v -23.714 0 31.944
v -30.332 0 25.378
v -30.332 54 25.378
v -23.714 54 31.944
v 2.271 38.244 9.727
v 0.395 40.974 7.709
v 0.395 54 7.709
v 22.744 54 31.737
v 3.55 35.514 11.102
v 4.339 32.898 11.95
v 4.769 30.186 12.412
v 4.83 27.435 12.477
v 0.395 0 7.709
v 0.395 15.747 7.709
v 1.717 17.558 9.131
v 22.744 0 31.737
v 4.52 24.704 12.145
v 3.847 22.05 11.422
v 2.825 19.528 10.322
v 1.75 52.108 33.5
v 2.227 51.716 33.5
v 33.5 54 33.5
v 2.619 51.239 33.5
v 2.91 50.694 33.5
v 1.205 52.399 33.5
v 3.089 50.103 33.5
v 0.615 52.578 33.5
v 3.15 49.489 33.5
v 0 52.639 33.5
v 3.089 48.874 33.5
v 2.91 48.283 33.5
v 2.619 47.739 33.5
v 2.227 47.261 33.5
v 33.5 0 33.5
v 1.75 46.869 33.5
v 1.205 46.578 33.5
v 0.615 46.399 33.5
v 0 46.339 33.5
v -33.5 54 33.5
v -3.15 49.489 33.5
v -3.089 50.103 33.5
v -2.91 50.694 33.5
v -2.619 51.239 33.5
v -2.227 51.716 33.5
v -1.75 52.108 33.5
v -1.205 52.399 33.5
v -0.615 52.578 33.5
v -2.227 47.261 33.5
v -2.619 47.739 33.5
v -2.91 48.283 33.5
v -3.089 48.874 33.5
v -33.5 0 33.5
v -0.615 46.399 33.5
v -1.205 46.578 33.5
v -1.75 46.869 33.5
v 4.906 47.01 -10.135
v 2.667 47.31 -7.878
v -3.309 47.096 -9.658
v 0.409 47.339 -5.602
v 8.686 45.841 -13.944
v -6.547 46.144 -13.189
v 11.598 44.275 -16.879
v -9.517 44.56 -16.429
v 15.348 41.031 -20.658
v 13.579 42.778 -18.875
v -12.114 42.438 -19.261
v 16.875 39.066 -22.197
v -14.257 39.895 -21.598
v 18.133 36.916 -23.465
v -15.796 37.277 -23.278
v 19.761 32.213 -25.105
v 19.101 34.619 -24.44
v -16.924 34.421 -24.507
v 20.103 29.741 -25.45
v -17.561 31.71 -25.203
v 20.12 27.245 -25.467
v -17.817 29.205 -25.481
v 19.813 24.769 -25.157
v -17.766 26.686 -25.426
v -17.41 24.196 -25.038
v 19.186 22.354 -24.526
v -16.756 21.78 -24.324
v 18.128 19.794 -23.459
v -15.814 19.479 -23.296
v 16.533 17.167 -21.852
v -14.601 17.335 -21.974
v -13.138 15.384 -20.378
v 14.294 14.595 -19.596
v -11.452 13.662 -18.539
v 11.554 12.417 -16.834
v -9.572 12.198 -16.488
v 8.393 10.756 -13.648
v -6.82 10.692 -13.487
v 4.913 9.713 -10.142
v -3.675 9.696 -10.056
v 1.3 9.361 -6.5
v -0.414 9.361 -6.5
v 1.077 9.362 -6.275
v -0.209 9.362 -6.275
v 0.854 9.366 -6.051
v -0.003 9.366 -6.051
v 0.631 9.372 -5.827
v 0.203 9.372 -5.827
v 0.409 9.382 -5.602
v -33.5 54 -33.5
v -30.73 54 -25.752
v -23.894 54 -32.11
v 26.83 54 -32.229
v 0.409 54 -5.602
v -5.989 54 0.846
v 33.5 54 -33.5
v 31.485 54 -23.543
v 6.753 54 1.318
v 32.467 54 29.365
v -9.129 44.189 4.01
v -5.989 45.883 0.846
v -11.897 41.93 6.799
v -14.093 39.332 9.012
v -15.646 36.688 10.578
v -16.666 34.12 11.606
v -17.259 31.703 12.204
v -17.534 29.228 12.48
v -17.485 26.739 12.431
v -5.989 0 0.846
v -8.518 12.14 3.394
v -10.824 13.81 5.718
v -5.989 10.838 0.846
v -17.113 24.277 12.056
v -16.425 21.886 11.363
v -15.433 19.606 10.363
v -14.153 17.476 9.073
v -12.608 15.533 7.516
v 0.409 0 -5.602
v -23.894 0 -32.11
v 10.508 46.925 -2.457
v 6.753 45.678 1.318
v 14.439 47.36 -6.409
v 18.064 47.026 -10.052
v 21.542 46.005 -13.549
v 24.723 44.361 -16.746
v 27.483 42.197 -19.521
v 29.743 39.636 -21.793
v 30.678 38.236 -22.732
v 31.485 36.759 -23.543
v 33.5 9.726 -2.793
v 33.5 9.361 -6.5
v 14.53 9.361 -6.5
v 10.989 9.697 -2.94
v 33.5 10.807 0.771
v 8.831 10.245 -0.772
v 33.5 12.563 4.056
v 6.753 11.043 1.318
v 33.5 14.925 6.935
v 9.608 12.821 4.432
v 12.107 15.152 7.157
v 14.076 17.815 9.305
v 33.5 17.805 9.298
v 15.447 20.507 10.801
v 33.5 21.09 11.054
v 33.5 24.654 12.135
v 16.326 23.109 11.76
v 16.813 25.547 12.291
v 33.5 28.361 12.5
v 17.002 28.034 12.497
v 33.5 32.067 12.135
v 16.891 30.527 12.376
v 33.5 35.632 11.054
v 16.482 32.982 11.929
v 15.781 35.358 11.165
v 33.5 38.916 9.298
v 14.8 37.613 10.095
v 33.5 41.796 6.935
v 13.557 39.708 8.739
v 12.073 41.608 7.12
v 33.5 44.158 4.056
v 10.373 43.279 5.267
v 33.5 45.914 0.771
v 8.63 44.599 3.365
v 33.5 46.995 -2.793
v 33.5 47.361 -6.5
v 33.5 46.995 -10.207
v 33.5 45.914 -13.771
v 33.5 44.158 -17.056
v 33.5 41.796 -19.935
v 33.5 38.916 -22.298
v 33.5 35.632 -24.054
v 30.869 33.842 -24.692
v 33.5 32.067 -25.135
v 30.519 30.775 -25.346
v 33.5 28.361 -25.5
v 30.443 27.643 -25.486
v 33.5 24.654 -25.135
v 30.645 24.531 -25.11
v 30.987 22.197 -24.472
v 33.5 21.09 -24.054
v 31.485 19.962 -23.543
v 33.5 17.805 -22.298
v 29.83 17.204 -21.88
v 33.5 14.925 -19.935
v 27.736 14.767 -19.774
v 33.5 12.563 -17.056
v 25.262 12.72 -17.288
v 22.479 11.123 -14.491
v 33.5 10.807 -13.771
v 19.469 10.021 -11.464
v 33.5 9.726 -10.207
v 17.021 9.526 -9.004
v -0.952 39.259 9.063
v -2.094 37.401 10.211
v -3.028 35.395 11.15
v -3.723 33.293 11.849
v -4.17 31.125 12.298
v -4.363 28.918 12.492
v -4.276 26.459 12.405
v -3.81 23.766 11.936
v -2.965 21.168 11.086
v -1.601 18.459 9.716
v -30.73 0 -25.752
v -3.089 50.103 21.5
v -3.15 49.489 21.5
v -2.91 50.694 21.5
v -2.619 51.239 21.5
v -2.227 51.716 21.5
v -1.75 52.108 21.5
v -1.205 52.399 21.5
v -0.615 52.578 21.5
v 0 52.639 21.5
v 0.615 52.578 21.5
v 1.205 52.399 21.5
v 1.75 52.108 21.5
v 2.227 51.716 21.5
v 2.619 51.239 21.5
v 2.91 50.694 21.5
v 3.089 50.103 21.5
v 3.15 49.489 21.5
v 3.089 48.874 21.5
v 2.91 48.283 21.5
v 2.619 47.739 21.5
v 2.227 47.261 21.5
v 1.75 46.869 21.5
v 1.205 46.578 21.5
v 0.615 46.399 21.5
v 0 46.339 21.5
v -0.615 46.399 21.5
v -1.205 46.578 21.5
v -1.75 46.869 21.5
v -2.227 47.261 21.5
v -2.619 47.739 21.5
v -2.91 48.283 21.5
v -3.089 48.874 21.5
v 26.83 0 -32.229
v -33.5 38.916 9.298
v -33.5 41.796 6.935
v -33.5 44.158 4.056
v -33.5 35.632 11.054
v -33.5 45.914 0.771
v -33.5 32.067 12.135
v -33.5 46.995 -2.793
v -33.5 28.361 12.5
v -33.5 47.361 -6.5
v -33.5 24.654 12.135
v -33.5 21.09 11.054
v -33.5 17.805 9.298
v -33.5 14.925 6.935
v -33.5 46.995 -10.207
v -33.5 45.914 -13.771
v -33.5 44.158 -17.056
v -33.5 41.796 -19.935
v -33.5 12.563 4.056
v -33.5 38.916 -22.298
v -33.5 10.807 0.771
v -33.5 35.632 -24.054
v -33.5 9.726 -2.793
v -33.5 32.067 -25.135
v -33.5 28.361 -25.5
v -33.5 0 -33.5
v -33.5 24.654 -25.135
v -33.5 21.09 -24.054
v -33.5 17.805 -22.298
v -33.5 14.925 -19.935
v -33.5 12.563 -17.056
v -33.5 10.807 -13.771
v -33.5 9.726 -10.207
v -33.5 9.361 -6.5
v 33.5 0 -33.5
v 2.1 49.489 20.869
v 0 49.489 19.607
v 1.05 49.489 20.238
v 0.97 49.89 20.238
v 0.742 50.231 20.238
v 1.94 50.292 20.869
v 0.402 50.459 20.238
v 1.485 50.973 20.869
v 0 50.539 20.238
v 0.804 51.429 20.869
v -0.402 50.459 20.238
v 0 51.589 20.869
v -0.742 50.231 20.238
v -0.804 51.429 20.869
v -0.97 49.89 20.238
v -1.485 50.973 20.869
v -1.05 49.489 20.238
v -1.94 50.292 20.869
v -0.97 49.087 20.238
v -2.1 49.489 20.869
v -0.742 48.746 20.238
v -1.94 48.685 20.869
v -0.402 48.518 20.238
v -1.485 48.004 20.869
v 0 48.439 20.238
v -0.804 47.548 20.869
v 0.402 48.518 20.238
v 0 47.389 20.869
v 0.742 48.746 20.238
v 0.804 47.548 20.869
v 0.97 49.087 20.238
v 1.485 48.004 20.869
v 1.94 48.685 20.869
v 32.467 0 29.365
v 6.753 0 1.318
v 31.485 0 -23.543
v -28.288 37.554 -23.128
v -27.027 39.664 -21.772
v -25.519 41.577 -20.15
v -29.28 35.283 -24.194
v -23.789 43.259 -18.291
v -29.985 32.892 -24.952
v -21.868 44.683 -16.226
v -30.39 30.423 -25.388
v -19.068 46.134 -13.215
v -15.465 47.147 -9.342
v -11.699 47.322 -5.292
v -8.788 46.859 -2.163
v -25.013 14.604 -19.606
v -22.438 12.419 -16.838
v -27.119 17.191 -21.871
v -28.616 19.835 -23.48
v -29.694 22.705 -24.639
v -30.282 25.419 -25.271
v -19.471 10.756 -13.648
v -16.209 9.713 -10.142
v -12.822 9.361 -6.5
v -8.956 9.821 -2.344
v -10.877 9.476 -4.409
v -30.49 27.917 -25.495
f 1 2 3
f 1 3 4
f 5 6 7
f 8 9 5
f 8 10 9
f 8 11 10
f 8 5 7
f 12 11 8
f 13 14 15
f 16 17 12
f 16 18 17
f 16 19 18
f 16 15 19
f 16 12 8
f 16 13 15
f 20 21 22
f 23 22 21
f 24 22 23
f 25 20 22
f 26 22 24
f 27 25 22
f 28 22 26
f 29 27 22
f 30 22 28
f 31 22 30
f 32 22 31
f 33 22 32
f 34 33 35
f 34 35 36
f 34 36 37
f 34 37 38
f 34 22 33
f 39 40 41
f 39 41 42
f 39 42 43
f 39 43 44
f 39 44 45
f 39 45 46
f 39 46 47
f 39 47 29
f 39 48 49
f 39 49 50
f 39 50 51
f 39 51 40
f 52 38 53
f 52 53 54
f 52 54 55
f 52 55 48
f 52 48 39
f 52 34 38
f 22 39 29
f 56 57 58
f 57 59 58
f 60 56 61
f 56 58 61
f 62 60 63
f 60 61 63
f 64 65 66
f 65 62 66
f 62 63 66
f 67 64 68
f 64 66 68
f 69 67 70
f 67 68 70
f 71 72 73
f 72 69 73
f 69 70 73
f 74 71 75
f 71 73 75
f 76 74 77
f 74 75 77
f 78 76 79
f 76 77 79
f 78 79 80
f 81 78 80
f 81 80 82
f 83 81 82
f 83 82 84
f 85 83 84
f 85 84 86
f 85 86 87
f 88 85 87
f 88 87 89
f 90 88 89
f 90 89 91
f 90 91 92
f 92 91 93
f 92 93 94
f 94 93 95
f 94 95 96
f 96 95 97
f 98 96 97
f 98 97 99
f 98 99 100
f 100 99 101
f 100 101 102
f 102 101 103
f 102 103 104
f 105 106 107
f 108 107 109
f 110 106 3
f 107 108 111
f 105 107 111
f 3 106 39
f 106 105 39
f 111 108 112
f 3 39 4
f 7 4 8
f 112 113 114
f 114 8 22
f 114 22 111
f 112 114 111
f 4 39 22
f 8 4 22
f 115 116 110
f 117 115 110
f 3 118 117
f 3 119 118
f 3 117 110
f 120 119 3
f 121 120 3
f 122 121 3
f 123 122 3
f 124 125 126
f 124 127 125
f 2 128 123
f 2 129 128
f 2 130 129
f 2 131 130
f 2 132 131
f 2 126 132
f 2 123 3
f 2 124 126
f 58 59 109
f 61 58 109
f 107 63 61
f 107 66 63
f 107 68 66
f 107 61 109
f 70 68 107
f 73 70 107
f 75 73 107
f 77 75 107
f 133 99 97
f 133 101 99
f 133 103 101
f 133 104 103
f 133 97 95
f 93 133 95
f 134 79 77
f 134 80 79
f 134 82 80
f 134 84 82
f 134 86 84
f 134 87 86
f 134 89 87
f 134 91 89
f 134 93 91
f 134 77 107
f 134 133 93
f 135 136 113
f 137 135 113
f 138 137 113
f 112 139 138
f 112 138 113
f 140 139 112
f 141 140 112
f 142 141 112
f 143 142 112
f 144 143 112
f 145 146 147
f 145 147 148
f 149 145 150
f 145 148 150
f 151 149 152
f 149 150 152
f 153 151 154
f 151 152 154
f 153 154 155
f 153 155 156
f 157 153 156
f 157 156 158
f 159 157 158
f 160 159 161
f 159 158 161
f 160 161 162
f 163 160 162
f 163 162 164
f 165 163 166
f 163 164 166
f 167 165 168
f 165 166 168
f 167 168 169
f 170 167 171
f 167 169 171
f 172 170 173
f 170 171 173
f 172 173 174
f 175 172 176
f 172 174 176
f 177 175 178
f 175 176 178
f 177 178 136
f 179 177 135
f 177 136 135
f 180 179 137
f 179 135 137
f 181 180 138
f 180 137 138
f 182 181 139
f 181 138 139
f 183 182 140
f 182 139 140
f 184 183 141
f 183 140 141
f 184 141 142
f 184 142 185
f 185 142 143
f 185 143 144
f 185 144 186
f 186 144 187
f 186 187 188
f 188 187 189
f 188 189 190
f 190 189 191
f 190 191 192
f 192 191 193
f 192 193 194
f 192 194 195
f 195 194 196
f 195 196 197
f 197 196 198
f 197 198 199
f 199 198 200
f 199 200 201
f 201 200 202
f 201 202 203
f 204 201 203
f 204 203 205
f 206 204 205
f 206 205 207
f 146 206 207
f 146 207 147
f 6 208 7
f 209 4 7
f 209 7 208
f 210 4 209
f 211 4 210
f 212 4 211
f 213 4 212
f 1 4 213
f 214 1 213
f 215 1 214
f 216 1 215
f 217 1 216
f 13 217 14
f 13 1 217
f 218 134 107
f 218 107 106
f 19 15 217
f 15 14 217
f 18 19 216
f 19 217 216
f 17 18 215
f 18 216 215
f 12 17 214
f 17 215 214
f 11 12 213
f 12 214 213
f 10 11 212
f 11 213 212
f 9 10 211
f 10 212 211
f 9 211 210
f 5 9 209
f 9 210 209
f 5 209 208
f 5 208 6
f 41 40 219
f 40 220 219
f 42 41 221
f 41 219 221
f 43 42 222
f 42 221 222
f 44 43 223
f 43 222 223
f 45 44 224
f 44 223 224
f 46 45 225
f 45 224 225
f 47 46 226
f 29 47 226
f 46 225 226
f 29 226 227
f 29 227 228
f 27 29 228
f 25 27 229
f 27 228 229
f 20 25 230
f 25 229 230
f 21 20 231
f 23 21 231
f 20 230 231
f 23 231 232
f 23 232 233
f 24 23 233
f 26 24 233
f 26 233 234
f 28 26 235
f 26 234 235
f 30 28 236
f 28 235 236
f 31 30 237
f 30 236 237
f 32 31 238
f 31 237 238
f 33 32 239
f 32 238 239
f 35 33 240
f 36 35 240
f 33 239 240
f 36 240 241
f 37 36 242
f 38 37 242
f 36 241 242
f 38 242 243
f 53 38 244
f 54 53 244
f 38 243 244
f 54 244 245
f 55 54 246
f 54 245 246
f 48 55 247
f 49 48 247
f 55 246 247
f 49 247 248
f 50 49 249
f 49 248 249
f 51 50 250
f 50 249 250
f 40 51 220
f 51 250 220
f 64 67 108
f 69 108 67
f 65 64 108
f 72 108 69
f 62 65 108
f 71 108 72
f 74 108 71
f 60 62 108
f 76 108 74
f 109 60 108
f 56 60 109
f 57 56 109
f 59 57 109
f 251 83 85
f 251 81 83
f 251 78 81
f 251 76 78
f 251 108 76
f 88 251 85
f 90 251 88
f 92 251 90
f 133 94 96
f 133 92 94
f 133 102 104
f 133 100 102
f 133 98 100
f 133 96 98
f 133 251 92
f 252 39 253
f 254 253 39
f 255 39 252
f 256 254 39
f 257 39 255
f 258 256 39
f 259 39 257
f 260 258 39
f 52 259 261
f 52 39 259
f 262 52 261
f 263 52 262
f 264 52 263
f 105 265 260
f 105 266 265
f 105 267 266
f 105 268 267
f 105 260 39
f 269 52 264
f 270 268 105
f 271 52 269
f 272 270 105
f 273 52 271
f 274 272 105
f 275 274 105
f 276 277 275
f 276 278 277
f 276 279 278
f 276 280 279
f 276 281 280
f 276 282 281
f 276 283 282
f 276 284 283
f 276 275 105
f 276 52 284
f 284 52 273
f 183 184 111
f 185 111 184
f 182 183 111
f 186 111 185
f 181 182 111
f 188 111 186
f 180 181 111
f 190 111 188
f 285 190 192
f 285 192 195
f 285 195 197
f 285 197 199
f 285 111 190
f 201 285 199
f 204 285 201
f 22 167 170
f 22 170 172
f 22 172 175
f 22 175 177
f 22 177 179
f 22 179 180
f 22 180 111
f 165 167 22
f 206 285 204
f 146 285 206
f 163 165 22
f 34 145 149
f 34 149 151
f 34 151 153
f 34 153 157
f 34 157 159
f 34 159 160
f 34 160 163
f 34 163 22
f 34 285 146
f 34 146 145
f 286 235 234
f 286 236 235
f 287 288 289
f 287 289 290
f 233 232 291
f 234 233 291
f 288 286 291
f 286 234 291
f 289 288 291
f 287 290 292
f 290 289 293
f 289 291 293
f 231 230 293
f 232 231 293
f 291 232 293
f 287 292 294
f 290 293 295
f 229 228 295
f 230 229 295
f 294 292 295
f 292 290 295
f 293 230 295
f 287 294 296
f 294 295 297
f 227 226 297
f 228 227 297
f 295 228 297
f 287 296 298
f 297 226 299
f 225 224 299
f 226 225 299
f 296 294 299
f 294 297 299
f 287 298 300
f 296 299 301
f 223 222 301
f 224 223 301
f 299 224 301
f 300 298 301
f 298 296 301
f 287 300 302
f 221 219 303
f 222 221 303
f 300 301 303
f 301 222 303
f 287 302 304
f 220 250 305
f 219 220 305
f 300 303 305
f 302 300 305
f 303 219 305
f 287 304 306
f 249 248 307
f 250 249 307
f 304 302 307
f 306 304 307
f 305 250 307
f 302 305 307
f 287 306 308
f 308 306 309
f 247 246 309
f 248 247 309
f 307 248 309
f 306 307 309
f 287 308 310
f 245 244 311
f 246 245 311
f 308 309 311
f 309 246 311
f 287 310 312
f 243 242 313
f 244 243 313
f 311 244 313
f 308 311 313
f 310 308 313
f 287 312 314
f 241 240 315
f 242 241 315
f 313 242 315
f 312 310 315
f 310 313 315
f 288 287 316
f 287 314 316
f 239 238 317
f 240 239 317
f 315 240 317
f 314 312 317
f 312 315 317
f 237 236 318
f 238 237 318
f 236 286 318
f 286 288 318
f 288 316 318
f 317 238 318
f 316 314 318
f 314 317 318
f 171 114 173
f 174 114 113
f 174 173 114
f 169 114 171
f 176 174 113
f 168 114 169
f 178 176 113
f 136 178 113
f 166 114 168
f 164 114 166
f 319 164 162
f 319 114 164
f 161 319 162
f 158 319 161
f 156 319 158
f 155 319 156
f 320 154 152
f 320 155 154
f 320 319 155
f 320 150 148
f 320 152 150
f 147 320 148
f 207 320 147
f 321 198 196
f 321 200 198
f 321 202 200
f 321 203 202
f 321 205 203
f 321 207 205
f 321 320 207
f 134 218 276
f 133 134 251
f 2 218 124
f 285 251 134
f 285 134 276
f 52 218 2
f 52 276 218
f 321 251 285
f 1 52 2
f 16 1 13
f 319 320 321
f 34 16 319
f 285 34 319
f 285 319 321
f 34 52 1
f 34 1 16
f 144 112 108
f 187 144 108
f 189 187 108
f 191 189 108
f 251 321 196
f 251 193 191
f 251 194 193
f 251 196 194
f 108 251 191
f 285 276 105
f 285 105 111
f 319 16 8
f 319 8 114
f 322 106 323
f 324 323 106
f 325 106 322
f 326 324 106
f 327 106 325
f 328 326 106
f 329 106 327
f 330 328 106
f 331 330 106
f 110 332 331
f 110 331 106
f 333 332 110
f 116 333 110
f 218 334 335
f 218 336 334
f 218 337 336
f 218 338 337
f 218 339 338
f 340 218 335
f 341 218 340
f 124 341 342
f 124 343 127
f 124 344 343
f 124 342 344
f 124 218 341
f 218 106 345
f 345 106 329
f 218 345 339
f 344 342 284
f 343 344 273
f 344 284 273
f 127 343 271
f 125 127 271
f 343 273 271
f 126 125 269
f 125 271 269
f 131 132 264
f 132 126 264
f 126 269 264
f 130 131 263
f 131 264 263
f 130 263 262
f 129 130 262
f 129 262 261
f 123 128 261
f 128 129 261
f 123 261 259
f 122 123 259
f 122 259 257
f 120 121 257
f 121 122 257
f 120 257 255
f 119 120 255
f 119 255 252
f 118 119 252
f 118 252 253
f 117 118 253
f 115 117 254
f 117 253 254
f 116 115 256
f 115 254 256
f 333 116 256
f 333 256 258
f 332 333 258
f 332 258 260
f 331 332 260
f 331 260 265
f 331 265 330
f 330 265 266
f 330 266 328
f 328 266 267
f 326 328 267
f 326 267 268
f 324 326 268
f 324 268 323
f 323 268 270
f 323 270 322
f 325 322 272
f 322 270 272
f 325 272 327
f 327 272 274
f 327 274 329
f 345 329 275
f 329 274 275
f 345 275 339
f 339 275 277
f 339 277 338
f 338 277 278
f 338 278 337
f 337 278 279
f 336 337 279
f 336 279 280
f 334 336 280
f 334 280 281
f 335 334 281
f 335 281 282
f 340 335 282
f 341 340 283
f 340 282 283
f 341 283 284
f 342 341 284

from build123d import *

# Parameters (mm, degrees)
F1_DEPTH = 54
F3_D     = 38
F5_D     = 6.3
F5_DEPTH = 12
F5_TIP   = 1.8927109499


# Not quite as in the source:
# - a feature names something its author has since deleted; it is built from what else it names


with BuildPart() as f1:
    # F0 (on Front) → F1 (new body)
    with BuildSketch(Plane.XZ):
        Polygon((28.0907023698, -33.5), (33.5, -33.5), (33.5, -25.5690795523), (31.4847062311, -23.5432559017), (26.8295921046, -32.2290576438), align=None)
        Polygon((-25.1683651974, -33.5), (28.0907023698, -33.5), (26.8295921046, -32.2290576438), (0.4087149623, -5.6021933843), (-23.8942493722, -32.1102777692), align=None)
        Polygon((31.4847062311, -23.5432559017), (33.5, -25.5690795523), (33.5, 30.4916165769), (32.4673100421, 29.3652258959), (6.7529691073, 1.3177042019), align=None)
        Polygon((-33.5, -33.5), (-25.1683651974, -33.5), (-23.8942493722, -32.1102777692), (-30.7295821389, -25.7524549578), (-33.5, -28.7309475243), align=None)
        Polygon((32.4673100421, 29.3652258959), (33.5, 30.4916165769), (33.5, 33.5), (24.3835517234, 33.5), (22.7440218852, 31.7373318104), align=None)
        Polygon((-33.5, 28.5708867013), (-33.5, -28.7309475243), (-30.7295821389, -25.7524549578), (-5.9894273378, 0.8458312449), (-30.3316890574, 25.3778744124), align=None)
        Polygon((22.7440218852, 31.7373318104), (24.3835517234, 33.5), (-25.2620486716, 33.5), (-23.714253223, 31.9441173419), (0.3945803139, 7.7093154877), align=None)
        Polygon((-33.5, 33.5), (-33.5, 28.5708867013), (-30.3316890574, 25.3778744124), (-23.714253223, 31.9441173419), (-25.2620486716, 33.5), align=None)
    extrude(amount=-F1_DEPTH)

    # F3 (through all)
    with Locations(Plane.YZ.offset(33.5)):
        with Locations((28.3605195582, -6.5)):
            Hole(F3_D / 2)

    # F5
    with Locations(Plane.XY.offset(33.5)):
        with Locations((0, 49.4885705411)):
            Hole(F5_D / 2, depth=F5_DEPTH)
            with Locations((0, 0, -(F5_DEPTH + F5_TIP / 2))):  # 118° drill point
                Cone(0, F5_D / 2, F5_TIP, mode=Mode.SUBTRACT)


solid = f1.part
